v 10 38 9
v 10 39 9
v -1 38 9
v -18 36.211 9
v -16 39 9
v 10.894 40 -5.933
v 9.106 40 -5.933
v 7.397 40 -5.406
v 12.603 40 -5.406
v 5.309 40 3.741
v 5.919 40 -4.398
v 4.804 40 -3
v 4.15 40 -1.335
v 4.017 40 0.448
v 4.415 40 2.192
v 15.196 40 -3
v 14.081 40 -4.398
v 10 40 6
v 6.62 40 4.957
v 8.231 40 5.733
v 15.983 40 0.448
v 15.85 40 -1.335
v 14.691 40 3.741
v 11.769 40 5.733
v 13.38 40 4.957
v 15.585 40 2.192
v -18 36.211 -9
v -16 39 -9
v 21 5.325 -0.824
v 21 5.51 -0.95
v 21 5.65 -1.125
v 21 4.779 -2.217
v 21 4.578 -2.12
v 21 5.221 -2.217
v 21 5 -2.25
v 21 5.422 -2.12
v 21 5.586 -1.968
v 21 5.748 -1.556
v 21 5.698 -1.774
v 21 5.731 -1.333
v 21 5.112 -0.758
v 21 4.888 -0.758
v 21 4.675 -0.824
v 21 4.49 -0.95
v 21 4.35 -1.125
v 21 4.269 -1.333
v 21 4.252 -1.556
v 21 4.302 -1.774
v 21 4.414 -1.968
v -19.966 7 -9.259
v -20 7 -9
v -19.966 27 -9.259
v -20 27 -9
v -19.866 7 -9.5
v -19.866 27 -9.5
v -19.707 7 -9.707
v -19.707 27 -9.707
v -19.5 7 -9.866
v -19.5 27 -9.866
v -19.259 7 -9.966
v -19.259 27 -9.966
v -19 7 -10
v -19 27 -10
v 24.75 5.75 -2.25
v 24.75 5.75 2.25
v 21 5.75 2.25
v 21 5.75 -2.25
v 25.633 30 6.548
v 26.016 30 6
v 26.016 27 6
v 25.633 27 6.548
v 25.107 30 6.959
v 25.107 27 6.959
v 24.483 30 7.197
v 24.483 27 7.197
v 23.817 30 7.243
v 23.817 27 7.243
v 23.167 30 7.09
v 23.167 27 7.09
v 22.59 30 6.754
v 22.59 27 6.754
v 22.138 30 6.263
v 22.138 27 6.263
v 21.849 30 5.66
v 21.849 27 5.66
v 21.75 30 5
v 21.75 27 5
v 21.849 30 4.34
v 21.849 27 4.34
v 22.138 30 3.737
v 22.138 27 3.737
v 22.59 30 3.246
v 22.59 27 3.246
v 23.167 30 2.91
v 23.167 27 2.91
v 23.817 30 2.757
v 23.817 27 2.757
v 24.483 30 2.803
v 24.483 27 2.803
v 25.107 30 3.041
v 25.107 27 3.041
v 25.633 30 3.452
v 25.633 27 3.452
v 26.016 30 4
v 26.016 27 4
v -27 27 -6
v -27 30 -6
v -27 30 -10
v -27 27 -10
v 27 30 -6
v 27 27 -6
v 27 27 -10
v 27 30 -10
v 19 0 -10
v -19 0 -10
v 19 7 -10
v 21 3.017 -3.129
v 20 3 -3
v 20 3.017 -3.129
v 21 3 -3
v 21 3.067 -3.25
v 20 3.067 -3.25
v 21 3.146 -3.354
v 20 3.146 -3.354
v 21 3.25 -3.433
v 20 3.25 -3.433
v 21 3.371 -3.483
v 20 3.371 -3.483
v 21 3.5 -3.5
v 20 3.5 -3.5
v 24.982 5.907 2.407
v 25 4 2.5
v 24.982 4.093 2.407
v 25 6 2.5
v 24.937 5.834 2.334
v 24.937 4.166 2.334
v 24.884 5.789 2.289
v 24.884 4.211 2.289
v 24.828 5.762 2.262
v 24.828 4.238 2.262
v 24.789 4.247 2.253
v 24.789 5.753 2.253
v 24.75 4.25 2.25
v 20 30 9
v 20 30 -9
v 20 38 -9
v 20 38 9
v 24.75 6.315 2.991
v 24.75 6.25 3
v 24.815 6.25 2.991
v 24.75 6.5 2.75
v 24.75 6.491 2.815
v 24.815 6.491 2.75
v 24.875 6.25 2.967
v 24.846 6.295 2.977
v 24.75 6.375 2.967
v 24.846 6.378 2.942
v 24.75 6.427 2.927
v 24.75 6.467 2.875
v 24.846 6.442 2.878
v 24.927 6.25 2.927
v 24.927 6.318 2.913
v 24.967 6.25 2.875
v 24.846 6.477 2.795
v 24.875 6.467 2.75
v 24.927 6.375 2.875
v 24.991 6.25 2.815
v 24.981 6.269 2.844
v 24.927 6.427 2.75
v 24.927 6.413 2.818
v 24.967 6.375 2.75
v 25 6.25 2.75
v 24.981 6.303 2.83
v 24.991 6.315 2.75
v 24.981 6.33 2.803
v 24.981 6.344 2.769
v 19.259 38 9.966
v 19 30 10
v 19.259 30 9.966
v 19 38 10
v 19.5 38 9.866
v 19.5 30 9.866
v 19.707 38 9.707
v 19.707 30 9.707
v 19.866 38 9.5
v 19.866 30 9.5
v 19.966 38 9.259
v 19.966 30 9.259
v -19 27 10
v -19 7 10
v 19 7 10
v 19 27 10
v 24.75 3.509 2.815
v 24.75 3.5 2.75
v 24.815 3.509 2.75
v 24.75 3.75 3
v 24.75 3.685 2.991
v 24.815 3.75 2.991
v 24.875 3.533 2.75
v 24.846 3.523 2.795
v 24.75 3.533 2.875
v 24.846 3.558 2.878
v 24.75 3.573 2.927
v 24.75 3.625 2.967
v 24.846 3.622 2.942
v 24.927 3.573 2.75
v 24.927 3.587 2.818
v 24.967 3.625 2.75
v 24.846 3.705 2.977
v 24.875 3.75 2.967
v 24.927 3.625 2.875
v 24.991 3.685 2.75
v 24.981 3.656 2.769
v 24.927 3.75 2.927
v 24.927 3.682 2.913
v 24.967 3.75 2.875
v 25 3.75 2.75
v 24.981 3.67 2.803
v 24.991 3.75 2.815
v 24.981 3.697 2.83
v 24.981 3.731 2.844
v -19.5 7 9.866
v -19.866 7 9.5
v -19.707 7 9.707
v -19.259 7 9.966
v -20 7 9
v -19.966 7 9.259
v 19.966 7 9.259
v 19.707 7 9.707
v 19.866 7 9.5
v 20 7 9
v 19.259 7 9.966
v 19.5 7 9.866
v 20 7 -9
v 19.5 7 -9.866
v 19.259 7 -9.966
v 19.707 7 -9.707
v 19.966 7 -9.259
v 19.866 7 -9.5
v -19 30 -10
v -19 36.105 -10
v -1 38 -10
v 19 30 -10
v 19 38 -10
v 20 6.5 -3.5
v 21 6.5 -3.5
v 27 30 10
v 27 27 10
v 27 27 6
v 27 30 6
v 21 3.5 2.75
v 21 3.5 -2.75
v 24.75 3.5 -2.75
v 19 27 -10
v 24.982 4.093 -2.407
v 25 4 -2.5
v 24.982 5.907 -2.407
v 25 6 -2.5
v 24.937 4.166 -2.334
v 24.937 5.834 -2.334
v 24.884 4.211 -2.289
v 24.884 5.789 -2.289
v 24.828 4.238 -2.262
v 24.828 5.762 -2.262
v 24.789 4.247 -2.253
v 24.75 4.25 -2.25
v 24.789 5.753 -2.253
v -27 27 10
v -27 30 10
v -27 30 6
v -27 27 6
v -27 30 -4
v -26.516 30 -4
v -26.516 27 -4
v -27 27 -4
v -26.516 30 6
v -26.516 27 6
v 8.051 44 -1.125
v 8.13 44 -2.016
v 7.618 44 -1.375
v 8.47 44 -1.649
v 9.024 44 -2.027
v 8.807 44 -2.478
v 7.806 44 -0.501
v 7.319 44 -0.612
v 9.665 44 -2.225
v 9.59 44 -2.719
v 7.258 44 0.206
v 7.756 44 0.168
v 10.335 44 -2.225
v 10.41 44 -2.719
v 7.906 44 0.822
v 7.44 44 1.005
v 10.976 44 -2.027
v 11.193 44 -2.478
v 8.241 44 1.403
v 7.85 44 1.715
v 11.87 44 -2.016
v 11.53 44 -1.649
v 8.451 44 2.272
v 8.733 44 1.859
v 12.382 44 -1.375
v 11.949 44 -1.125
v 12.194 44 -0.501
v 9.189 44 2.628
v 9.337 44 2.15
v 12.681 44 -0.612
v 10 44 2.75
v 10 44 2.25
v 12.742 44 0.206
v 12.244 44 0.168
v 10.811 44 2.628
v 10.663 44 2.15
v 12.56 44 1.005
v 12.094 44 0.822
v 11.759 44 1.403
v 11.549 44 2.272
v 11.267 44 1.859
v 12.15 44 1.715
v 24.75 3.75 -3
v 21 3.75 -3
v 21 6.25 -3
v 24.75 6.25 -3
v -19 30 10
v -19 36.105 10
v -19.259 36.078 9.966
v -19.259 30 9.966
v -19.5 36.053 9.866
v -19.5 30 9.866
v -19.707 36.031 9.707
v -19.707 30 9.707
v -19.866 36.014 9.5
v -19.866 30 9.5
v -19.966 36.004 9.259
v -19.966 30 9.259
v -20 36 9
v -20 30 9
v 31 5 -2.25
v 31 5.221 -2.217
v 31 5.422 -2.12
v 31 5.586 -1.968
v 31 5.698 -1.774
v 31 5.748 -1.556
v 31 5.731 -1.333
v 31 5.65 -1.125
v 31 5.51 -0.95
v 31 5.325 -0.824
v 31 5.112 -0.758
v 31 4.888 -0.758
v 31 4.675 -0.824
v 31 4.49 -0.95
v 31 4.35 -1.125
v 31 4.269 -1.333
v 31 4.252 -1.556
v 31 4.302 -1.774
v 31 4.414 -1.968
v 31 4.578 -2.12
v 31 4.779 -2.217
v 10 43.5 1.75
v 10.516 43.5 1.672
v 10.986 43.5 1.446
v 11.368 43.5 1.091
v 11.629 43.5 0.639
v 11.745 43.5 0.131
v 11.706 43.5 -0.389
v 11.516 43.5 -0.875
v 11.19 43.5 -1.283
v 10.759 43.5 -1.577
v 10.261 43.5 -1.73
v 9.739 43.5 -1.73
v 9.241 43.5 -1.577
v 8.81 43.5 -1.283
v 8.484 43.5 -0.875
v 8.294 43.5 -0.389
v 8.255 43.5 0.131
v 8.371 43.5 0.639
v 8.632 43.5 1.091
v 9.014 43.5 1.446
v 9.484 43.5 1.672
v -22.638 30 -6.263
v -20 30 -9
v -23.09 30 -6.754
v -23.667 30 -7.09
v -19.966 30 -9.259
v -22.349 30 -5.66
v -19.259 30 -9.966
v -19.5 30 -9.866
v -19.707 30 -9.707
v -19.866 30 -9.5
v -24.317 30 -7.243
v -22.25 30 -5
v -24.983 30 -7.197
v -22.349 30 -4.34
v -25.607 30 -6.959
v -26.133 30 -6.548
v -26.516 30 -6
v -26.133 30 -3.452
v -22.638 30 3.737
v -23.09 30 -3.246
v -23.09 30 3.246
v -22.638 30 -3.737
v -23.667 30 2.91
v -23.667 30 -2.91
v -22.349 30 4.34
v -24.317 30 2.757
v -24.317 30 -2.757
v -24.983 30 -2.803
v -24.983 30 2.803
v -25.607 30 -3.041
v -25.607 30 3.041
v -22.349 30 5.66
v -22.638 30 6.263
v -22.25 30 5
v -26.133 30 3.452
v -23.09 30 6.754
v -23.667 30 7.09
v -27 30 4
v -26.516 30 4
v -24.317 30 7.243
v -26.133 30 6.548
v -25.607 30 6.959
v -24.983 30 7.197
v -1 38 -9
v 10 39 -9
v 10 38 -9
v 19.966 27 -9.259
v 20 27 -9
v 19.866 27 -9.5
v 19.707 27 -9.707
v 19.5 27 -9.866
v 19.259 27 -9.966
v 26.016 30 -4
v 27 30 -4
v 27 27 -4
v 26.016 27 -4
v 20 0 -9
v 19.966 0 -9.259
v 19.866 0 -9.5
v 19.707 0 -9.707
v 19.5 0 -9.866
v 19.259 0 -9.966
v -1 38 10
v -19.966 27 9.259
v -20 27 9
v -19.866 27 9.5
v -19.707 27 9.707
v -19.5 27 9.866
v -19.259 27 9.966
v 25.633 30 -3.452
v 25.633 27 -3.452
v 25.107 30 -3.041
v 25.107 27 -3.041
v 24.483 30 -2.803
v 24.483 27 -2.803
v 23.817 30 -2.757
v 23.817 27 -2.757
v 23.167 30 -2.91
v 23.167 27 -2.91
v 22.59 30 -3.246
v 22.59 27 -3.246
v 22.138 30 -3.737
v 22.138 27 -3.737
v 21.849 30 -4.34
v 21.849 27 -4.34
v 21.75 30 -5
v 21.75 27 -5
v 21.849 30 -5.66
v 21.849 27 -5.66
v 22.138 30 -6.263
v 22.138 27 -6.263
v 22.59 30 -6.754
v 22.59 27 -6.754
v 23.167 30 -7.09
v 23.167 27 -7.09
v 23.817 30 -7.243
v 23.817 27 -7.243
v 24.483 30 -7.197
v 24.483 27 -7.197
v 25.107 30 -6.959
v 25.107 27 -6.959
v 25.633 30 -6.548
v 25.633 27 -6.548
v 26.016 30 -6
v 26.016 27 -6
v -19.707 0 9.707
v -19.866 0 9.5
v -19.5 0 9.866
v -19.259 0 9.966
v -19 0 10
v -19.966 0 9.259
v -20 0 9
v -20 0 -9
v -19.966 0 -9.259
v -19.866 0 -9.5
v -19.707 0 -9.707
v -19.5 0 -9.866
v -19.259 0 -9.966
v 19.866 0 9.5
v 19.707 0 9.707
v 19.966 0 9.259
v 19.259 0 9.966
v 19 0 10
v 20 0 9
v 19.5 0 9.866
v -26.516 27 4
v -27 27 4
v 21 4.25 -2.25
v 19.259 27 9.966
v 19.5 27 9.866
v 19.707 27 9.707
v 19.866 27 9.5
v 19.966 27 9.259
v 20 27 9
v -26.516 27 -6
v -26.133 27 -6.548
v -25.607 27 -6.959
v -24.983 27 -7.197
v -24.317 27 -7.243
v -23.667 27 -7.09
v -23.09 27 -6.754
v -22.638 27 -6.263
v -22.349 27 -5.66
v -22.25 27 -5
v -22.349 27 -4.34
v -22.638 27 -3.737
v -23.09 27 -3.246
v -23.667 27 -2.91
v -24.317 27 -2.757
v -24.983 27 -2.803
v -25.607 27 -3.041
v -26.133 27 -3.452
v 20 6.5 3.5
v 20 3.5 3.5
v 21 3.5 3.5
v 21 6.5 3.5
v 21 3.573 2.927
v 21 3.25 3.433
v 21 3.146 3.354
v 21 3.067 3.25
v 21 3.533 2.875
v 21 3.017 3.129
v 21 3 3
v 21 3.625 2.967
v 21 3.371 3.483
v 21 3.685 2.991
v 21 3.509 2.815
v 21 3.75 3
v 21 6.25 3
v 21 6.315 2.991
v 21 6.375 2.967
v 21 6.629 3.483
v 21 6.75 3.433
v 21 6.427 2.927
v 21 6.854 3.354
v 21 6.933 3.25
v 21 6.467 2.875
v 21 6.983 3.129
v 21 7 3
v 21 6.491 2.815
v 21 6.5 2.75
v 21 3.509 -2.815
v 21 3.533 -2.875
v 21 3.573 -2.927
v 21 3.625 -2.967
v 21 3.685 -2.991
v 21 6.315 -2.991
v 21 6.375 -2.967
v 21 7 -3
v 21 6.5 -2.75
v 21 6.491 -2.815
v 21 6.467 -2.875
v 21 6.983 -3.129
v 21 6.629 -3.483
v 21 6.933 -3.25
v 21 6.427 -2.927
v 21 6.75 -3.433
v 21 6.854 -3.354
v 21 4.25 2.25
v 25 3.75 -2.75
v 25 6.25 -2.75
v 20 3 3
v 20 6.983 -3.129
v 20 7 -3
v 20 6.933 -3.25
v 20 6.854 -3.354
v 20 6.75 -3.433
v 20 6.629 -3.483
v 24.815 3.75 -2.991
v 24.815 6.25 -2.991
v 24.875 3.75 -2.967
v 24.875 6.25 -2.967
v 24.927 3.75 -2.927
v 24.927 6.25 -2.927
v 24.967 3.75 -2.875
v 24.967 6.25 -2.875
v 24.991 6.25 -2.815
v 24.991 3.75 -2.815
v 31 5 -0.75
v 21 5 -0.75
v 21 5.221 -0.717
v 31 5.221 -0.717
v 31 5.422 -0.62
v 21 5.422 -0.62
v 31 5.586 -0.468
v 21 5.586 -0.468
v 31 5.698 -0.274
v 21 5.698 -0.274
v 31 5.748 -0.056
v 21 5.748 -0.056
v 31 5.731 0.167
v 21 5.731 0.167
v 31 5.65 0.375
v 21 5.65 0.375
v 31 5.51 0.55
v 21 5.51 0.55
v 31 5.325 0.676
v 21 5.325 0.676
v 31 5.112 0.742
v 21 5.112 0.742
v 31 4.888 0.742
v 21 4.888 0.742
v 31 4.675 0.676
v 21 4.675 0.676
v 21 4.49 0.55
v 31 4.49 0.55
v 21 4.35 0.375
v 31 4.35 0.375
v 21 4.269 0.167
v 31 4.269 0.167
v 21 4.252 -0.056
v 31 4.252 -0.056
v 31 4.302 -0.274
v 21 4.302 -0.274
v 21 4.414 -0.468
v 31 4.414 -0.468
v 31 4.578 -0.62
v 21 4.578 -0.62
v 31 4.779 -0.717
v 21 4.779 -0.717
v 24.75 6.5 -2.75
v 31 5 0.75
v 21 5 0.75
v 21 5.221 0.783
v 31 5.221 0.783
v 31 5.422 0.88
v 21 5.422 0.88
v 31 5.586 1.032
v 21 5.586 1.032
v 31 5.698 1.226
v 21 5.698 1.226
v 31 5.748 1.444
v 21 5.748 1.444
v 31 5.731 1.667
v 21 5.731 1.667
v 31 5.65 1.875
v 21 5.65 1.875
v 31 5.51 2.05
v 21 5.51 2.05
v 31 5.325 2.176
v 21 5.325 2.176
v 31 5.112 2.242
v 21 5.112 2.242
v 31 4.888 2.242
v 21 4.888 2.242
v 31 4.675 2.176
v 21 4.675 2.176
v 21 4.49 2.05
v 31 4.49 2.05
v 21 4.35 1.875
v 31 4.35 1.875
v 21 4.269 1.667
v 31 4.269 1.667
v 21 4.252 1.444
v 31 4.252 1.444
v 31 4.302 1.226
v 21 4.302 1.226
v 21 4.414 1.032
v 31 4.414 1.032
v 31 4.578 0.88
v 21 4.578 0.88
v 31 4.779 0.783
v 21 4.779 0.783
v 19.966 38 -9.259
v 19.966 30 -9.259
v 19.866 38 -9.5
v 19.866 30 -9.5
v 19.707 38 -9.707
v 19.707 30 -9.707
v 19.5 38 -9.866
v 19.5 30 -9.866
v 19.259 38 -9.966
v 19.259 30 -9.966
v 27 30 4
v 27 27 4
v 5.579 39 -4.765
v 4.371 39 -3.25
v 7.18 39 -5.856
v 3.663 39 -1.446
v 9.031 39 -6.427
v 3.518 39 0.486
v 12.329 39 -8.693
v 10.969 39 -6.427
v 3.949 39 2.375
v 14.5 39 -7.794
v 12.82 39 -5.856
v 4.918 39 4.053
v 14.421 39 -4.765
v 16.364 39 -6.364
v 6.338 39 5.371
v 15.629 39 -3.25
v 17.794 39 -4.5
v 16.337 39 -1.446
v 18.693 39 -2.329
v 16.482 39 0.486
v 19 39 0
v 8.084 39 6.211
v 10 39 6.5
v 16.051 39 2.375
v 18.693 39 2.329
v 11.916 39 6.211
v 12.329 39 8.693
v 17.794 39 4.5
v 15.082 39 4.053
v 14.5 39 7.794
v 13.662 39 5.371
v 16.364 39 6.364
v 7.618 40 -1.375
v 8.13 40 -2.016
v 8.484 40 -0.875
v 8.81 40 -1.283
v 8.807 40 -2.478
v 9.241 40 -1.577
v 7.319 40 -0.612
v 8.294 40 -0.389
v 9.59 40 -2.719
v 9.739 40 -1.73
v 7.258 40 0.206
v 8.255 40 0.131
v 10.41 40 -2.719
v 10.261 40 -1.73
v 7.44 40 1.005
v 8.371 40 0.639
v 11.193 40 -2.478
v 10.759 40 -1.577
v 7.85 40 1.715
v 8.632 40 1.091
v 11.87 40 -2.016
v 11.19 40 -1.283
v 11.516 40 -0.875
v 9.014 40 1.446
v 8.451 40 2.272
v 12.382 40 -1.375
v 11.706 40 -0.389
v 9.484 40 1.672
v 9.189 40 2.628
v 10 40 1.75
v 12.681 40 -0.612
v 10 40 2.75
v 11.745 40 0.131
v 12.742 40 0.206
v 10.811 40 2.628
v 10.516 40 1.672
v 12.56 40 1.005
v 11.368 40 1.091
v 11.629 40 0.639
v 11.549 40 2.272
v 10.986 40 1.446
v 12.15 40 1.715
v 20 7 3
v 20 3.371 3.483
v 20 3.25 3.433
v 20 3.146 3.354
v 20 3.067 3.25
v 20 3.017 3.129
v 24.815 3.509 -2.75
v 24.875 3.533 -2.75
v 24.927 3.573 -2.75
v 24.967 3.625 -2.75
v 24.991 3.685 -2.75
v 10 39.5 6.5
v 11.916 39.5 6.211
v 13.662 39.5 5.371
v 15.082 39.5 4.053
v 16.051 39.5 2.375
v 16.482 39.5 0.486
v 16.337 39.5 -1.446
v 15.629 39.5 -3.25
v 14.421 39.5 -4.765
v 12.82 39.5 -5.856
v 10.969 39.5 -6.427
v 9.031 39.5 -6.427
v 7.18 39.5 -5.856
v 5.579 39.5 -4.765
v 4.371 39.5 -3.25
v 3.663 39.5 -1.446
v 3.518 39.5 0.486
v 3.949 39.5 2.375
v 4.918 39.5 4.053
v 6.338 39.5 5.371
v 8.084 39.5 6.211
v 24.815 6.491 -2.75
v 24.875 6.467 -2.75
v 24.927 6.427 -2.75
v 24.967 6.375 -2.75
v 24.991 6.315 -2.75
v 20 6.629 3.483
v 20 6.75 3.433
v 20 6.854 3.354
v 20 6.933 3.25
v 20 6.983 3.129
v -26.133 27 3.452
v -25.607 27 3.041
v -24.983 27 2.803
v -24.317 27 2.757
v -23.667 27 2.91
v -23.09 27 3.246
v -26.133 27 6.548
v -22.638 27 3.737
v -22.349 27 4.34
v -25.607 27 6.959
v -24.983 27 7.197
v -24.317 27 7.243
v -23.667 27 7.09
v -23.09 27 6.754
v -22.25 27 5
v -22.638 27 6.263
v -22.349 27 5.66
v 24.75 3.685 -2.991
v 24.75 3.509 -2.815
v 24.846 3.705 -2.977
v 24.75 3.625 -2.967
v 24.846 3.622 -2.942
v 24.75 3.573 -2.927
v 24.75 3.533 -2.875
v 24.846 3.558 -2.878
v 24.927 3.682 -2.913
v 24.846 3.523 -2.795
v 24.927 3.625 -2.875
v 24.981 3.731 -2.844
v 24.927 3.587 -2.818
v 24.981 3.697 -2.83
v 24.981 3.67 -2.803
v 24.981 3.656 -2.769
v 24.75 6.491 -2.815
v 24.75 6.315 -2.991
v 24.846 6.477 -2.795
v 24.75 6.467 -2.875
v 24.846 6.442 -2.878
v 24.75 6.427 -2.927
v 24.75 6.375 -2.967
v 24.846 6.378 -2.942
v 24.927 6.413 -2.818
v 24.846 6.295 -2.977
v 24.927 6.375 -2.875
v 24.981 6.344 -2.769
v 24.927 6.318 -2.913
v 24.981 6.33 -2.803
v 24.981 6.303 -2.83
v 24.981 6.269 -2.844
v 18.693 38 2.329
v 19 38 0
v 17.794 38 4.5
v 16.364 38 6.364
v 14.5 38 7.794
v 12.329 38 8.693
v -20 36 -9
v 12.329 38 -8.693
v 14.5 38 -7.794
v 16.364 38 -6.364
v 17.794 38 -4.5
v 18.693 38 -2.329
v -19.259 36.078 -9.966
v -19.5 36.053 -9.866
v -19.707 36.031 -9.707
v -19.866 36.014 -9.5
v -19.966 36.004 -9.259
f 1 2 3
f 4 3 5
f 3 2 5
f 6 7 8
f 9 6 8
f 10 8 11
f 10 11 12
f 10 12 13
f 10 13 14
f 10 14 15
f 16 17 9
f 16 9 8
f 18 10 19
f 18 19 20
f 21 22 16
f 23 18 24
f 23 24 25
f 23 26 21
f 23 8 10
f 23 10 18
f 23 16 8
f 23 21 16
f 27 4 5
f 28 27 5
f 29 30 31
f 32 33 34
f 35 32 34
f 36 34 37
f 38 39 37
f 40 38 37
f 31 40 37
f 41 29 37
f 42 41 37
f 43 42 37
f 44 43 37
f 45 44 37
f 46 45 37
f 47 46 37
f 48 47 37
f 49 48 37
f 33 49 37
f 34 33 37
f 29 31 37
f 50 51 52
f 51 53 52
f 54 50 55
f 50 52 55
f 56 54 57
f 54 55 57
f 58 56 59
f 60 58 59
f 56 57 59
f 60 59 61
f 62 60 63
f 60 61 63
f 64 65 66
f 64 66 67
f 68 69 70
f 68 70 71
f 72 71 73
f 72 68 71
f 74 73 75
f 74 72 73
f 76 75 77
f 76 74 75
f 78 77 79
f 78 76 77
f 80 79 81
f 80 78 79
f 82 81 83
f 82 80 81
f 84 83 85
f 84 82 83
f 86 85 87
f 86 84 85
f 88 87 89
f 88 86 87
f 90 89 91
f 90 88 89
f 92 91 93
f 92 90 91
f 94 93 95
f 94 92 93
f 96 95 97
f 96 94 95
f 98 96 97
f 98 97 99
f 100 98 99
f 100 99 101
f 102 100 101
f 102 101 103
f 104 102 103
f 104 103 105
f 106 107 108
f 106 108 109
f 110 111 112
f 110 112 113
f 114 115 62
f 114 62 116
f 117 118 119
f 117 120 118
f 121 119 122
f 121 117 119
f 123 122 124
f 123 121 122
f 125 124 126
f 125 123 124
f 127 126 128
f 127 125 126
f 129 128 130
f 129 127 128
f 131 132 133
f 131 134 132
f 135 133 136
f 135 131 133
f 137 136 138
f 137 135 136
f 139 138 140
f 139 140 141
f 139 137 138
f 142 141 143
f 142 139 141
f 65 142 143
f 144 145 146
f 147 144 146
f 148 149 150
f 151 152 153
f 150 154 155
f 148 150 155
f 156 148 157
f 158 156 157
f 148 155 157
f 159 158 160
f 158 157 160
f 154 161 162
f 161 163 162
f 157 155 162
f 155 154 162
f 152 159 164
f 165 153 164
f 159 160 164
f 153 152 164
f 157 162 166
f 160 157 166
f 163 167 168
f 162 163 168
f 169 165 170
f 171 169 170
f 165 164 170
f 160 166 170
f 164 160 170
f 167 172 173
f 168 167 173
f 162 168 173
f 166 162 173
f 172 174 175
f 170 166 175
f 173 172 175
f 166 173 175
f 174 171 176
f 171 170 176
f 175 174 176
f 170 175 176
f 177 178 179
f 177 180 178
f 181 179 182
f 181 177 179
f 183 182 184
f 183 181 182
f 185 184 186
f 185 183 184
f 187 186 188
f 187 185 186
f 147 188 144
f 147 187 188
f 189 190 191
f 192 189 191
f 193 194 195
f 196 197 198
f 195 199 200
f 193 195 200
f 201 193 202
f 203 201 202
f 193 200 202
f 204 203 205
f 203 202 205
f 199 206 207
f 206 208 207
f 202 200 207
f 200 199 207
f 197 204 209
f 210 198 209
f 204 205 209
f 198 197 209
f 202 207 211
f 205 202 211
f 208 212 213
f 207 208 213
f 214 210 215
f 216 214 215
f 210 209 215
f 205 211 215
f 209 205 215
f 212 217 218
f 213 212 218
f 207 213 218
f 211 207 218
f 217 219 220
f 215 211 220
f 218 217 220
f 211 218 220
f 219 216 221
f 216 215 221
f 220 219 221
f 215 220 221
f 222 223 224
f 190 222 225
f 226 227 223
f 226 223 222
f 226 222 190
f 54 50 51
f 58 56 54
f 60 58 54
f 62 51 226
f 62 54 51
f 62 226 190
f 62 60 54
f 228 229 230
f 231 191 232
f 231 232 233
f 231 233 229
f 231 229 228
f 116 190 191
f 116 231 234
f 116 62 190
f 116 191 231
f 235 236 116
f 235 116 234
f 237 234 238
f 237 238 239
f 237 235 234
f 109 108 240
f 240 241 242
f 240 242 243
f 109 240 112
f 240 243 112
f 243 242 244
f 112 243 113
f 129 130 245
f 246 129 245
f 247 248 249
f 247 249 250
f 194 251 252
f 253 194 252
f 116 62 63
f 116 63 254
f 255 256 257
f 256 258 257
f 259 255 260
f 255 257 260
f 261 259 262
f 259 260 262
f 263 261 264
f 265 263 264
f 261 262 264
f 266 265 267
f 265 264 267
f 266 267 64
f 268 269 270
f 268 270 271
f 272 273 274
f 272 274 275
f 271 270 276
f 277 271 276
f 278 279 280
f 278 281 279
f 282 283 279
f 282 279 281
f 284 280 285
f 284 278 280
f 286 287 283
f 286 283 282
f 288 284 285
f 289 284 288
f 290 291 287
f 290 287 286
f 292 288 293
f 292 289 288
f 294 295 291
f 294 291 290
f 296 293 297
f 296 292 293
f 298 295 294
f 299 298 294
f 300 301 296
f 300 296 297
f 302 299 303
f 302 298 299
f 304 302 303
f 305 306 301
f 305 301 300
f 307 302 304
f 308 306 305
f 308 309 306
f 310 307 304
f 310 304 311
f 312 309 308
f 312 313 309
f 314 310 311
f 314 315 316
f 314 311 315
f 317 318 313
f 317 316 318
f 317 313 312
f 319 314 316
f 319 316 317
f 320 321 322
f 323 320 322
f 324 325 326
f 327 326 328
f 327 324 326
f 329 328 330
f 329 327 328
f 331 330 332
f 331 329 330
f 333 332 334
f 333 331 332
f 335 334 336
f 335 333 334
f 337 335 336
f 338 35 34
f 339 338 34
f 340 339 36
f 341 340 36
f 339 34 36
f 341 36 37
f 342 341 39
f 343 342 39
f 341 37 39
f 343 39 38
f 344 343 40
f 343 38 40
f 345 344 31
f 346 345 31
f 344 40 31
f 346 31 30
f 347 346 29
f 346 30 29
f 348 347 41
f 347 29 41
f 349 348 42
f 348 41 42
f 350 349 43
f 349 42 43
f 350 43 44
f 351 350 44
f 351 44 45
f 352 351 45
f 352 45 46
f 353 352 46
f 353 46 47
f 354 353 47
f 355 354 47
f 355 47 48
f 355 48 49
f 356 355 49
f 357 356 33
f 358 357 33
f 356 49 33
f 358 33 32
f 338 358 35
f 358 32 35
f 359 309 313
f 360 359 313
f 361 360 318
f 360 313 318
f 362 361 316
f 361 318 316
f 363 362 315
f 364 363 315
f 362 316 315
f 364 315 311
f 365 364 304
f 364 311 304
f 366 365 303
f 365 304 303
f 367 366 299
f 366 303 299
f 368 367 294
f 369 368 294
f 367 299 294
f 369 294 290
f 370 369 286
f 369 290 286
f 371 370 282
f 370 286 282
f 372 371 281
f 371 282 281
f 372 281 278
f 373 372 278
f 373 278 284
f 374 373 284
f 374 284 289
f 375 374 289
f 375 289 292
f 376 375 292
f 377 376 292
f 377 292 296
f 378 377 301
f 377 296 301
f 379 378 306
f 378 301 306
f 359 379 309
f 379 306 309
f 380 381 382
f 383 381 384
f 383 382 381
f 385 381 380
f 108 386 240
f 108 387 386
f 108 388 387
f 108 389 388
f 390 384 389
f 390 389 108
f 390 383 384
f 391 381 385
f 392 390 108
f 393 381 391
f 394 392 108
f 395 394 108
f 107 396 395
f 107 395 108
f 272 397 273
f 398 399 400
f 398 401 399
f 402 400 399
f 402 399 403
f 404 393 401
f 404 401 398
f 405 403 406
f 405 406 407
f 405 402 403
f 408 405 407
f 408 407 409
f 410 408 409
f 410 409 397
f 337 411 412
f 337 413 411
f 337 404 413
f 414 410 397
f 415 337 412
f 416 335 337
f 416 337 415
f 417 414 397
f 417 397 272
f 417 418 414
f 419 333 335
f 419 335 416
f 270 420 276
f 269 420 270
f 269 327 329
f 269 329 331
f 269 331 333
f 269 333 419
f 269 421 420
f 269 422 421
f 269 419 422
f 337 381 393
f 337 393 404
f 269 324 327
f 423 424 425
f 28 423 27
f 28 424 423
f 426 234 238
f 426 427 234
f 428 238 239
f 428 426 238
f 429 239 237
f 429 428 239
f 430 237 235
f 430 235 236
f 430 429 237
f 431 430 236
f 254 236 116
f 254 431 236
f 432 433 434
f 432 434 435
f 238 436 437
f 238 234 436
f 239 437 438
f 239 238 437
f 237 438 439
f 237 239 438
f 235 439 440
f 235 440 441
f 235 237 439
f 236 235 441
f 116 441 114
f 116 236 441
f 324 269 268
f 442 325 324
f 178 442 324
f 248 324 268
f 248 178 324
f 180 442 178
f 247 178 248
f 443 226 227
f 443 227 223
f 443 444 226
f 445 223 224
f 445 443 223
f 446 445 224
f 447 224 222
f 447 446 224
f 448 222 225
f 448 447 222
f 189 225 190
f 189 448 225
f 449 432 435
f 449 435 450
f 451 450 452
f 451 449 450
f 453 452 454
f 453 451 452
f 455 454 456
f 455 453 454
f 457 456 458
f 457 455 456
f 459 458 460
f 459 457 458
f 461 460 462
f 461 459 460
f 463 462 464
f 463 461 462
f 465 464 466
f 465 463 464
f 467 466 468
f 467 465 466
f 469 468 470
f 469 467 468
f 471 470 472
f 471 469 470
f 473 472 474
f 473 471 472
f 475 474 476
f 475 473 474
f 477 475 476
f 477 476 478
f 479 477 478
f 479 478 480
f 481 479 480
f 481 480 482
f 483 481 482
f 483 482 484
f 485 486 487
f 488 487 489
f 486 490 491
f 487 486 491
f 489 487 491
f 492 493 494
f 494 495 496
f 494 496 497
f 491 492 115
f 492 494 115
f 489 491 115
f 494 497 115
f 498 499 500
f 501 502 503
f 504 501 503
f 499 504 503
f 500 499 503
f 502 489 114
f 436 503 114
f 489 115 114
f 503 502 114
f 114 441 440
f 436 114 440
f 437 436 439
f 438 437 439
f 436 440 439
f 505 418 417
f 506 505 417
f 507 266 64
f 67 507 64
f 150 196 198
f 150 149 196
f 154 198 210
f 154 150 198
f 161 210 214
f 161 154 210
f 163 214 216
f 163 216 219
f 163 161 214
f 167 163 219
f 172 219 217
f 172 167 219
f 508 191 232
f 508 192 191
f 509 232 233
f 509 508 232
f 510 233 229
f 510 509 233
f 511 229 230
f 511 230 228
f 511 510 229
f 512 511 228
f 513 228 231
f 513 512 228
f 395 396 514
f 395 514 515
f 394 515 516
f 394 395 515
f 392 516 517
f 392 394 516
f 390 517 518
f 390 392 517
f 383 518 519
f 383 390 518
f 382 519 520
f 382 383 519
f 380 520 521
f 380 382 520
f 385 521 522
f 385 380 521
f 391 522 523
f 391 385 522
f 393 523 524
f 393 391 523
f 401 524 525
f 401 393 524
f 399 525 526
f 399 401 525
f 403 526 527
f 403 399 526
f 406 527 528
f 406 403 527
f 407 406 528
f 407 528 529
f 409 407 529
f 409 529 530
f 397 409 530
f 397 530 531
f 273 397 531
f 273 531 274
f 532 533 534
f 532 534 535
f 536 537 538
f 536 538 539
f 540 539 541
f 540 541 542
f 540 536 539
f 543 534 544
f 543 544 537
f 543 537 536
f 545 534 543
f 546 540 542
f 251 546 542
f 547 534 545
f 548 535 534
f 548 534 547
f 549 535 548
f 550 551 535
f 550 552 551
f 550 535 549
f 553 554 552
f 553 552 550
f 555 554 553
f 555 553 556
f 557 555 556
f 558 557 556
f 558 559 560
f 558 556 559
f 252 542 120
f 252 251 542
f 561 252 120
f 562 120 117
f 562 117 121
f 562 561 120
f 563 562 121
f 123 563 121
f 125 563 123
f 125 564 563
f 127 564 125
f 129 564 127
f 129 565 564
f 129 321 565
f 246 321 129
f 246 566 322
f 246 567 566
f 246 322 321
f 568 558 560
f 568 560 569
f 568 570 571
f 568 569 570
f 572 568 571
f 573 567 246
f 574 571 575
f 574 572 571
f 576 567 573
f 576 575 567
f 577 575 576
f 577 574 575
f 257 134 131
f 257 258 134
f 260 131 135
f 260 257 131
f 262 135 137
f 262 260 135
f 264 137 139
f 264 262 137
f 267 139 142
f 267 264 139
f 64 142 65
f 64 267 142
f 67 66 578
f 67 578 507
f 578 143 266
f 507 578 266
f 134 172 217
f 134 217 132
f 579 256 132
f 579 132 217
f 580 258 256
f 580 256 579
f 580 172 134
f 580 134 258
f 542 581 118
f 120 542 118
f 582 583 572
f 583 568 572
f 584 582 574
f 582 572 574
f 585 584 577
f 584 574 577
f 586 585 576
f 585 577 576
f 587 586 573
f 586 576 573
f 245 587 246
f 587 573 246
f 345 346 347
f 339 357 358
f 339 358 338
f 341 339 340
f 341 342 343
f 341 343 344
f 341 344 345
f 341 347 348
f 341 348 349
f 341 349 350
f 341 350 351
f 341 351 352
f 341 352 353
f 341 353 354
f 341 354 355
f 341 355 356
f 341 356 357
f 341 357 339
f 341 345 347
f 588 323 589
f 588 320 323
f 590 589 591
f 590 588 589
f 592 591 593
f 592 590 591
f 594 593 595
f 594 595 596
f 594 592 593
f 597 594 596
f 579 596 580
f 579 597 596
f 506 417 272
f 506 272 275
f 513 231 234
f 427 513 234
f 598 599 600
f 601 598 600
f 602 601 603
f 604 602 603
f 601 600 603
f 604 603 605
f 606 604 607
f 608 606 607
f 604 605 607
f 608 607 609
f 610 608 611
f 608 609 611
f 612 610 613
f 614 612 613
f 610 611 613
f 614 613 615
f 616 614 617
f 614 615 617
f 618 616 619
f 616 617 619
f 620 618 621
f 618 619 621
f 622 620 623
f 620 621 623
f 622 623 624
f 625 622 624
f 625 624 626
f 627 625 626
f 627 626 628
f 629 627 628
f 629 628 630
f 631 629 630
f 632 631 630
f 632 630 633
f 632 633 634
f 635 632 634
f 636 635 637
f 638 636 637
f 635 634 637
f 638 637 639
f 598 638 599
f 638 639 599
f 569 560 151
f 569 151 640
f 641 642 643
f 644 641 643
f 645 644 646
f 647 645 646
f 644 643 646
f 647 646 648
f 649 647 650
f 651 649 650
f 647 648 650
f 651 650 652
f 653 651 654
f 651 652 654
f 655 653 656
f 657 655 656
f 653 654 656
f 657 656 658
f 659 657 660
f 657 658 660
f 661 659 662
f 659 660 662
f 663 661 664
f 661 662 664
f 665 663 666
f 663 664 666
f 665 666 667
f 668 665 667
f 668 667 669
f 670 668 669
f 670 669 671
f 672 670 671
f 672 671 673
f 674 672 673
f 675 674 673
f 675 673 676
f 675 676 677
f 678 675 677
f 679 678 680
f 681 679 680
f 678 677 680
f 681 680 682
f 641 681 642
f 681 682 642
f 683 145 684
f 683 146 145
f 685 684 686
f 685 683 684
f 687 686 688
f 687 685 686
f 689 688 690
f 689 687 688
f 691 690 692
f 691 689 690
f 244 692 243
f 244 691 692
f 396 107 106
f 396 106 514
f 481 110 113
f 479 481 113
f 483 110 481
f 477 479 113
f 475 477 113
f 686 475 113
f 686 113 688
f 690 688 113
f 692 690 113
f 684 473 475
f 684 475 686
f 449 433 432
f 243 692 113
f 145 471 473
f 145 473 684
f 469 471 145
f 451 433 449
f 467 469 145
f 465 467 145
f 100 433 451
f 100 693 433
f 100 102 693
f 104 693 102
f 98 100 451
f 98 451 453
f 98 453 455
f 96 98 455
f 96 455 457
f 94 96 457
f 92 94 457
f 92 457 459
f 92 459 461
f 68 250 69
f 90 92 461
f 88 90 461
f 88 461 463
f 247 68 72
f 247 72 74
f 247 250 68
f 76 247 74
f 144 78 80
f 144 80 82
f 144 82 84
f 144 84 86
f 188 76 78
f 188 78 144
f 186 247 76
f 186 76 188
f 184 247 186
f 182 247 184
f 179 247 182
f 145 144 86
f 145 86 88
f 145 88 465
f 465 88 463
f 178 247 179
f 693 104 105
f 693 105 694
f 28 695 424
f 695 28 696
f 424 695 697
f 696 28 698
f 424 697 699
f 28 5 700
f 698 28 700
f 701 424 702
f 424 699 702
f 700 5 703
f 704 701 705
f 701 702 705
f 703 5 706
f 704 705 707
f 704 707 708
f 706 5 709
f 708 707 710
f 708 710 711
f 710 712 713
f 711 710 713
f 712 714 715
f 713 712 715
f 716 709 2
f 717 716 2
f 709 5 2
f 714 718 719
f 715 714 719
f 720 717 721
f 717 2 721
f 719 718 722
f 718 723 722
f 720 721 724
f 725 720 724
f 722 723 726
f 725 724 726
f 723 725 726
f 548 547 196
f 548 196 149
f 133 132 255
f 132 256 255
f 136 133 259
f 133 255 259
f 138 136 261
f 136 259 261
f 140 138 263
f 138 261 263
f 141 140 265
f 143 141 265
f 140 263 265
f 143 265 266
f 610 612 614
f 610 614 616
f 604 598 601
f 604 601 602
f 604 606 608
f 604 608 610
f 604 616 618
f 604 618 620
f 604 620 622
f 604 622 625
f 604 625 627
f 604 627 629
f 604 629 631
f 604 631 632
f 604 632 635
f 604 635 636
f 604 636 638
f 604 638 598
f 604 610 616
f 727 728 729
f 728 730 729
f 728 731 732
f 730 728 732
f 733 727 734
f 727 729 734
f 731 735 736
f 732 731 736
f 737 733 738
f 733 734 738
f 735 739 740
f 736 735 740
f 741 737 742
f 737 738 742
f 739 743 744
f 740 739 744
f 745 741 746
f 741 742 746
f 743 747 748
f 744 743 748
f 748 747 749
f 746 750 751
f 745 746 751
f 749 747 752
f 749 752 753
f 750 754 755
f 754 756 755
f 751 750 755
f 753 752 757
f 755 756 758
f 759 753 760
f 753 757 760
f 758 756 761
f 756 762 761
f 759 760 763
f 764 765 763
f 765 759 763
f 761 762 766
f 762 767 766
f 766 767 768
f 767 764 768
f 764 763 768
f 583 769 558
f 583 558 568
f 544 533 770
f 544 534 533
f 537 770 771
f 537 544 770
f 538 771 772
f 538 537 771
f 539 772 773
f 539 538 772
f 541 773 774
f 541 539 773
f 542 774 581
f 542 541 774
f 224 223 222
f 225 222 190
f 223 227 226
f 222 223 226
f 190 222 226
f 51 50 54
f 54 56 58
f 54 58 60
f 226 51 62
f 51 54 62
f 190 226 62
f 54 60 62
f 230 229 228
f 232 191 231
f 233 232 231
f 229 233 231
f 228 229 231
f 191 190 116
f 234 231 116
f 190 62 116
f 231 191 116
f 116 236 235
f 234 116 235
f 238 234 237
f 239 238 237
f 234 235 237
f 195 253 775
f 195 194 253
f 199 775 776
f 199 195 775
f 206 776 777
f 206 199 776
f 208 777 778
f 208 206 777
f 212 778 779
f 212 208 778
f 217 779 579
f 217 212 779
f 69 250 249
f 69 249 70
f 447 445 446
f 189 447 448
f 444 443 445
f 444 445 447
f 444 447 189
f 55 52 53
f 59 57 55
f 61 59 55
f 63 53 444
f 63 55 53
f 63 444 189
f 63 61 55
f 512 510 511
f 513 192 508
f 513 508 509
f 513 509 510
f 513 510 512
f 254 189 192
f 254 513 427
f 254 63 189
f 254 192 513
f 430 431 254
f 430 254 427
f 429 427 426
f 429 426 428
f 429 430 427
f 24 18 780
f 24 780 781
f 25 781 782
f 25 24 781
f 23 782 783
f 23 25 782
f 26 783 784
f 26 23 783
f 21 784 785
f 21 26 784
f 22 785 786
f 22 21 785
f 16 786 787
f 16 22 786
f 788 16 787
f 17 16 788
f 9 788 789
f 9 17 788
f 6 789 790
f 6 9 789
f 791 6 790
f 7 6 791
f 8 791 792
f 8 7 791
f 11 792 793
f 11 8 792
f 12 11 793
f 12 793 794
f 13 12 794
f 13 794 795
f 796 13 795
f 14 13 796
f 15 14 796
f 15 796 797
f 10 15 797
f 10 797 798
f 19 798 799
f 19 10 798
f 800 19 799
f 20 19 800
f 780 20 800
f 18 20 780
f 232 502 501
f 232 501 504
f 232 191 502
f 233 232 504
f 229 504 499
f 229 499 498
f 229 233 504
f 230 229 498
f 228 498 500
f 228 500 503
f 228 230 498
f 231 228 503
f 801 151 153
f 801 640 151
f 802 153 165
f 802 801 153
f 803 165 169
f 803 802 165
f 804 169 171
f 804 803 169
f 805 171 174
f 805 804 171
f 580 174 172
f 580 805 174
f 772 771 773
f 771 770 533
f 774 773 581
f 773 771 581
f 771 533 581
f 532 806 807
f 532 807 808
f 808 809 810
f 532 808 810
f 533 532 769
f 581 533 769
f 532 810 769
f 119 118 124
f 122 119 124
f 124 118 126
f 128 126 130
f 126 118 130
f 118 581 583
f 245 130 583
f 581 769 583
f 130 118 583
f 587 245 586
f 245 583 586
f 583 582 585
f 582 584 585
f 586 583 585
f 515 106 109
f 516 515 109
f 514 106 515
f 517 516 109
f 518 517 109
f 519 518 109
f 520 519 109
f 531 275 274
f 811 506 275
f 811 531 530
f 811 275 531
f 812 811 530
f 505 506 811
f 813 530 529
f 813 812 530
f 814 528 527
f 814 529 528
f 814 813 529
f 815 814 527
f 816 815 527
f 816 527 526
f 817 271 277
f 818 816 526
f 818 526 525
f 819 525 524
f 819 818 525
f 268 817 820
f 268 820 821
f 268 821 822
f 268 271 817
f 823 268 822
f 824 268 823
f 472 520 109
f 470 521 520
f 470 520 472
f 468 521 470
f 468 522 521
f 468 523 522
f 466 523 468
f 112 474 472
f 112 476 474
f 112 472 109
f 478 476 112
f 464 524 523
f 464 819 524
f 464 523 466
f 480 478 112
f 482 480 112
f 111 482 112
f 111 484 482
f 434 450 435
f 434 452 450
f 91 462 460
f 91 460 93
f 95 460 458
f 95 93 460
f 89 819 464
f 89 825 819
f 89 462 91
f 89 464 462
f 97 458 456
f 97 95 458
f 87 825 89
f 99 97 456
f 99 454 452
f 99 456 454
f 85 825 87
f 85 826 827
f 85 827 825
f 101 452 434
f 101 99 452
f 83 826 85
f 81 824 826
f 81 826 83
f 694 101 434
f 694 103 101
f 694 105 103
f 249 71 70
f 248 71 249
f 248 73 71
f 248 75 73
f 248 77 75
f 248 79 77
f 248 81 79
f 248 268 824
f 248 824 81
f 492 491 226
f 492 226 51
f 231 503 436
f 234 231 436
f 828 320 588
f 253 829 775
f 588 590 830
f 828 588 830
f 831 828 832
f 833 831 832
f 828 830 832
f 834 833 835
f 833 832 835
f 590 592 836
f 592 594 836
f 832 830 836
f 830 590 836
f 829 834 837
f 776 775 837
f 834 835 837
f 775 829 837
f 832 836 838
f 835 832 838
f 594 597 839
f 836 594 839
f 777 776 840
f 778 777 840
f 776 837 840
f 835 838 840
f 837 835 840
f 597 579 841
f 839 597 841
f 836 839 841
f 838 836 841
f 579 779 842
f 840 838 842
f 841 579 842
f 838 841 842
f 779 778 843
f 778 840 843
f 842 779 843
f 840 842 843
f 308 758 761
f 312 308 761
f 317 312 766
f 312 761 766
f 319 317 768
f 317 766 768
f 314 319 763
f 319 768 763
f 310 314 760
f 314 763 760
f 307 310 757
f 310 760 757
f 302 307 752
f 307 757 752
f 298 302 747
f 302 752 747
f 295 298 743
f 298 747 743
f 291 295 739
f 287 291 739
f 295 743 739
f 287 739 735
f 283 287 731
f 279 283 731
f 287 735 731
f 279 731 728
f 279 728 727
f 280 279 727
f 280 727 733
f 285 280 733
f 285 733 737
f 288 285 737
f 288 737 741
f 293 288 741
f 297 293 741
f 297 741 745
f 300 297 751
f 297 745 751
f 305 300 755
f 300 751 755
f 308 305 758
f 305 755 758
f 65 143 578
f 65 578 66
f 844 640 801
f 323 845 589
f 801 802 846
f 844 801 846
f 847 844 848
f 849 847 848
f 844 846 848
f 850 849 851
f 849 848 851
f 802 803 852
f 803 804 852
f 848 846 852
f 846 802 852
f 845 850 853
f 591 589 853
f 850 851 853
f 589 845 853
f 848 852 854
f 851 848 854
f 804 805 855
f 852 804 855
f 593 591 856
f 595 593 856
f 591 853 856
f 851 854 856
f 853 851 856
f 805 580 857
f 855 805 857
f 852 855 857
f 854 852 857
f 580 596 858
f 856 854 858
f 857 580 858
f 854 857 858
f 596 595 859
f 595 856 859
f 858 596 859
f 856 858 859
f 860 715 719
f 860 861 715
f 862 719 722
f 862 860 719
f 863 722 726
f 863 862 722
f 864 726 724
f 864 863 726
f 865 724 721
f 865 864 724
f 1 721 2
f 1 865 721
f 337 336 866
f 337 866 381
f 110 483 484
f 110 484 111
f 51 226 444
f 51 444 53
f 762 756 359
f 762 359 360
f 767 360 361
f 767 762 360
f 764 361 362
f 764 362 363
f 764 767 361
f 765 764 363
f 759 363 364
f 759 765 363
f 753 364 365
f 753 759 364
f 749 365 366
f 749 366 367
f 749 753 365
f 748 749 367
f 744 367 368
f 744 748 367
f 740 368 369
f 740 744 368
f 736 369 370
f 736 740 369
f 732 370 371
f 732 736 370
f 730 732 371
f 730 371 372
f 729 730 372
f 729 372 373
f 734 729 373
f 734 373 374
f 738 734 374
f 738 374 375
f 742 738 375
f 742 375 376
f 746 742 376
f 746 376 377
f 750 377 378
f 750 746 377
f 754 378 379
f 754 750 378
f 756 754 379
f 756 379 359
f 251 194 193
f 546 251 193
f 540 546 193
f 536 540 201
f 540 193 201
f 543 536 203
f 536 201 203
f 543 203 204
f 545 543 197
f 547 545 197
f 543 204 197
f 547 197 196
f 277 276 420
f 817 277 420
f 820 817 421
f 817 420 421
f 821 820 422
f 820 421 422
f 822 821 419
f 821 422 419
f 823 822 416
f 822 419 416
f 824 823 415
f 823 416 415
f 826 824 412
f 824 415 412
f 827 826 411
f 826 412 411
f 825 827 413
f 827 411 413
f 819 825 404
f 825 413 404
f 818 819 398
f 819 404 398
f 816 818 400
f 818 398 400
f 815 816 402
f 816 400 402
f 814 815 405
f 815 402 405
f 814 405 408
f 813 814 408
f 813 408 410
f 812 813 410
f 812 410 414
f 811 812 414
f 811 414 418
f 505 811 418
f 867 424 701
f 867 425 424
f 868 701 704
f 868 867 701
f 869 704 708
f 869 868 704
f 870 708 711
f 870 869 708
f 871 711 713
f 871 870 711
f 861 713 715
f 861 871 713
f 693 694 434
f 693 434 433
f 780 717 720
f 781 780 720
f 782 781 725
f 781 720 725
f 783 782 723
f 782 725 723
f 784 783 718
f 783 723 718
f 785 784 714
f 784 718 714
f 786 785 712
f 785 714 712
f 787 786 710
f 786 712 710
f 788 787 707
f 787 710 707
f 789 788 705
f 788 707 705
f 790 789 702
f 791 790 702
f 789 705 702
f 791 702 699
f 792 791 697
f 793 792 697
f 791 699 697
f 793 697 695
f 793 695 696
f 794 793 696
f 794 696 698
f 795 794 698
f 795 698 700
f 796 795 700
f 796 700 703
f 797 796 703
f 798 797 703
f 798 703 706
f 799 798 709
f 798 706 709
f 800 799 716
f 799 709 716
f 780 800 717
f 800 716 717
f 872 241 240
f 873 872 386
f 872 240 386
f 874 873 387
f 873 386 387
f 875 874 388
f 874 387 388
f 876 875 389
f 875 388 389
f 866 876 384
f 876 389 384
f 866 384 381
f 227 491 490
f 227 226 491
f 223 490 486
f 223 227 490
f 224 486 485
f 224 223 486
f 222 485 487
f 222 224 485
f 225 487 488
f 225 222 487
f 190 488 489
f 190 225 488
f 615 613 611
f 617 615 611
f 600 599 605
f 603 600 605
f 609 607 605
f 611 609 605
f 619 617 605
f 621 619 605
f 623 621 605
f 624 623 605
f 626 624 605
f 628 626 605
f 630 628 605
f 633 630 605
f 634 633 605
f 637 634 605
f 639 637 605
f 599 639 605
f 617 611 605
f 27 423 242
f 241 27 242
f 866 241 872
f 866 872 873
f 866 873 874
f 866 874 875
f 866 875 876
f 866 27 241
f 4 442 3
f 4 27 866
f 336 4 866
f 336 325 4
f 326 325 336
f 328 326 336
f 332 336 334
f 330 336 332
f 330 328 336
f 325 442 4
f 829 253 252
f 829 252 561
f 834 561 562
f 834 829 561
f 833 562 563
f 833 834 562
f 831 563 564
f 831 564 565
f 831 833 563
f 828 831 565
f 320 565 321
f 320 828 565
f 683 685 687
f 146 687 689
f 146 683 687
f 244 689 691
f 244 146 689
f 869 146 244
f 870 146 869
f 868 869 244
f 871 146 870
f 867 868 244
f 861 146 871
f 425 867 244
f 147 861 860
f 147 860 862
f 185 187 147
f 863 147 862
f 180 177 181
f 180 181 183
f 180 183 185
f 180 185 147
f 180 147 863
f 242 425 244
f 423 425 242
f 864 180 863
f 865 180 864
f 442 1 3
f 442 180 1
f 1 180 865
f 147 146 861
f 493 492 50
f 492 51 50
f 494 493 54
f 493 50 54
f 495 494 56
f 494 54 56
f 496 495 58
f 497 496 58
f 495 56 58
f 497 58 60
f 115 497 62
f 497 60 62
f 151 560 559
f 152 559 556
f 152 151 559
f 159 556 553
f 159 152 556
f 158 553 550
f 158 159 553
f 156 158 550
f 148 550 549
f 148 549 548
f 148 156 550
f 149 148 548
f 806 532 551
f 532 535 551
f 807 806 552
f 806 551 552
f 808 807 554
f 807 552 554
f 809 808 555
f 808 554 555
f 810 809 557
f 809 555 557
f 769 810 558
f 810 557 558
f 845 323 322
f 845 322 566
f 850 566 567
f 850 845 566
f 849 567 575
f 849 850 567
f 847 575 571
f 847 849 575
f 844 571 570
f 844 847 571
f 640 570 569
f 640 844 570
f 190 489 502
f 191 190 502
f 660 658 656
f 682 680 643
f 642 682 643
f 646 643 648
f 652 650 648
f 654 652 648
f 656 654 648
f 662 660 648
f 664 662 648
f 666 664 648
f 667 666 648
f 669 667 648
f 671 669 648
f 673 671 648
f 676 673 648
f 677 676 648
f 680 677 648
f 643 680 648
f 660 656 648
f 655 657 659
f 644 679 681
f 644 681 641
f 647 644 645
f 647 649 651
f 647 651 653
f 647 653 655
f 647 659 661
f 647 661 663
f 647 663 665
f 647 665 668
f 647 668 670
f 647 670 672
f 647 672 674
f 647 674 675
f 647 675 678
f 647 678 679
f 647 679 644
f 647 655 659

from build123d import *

# Parameters (mm, degrees)
SKETCH1_W            = 40
SKETCH1_H            = 20
BOSS_EXTRUDE1_DEPTH  = 7
SKETCH2_W            = 40
SKETCH2_H            = 20
BOSS_EXTRUDE2_DEPTH  = 20
BOSS_EXTRUDE3_DEPTH  = 20
BOSS_EXTRUDE4_DEPTH  = 9
SKETCH5_R            = 6.5
BOSS_EXTRUDE5_DEPTH  = 1
CHAMFER1_SIZE        = 0.5
FILLET1_R            = 9
FILLET2_R            = 1
FILLET3_R            = 1
FILLET4_R            = 1
CUT_EXTRUDE1_DEPTH   = 3
SKETCH7_R            = 2.75
SKETCH7_R_2          = 1.75
BOSS_EXTRUDE6_DEPTH  = 4
CHAMFER2_SIZE        = 0.5
SKETCH8_W            = 7
SKETCH8_H            = 4
BOSS_EXTRUDE7_DEPTH  = 1
SKETCH9_W            = 6
SKETCH9_H            = 3
BOSS_EXTRUDE8_DEPTH  = 4
SKETCH10_W           = 4.5
SKETCH10_H           = 1.5
CUT_EXTRUDE2_DEPTH   = 4
SKETCH11_R           = 0.75
BOSS_EXTRUDE9_DEPTH  = 10
SKETCH12_R           = 0.75
BOSS_EXTRUDE10_DEPTH = 10
SKETCH13_R           = 0.75
BOSS_EXTRUDE11_DEPTH = 10
FILLET5_R            = 0.5
FILLET6_R            = 0.25
FILLET7_R            = 0.25


with BuildPart() as part:
    # Sketch1 → Boss-Extrude1 (new body)
    with BuildSketch(Plane(origin=(0, 0, 0), x_dir=(1, 0, 0), z_dir=(0, 1, 0))):
        Rectangle(SKETCH1_W, SKETCH1_H)
    extrude(amount=BOSS_EXTRUDE1_DEPTH)

    # Fillet2
    fillet2_edges = [part.edges().sort_by_distance(p)[0] for p in [
        (-20, 3.5, -10),
        (20, 3.5, -10),
        (20, 3.5, 10),
        (-20, 3.5, 10),
    ]]
    fillet(fillet2_edges, radius=FILLET2_R)


with BuildPart() as body_2:
    # Sketch2 → Boss-Extrude2 (new body)
    with BuildSketch(Plane(origin=(0, 7, 0), x_dir=(1, 0, 0), z_dir=(0, 1, 0))):
        Rectangle(SKETCH2_W, SKETCH2_H)
    extrude(amount=BOSS_EXTRUDE2_DEPTH)

    # Fillet3
    fillet3_edges = [body_2.edges().sort_by_distance(p)[0] for p in [
        (-20, 17, -10),
        (20, 17, -10),
        (20, 17, 10),
        (-20, 17, 10),
    ]]
    fillet(fillet3_edges, radius=FILLET3_R)


with BuildPart() as body_3:
    # Sketch3 → Boss-Extrude3 (new body)
    with BuildSketch(Plane.XY.offset(10)):
        Polygon((-27, 27), (27, 27), (27, 30), (20, 30), (20, 38), (-1, 38), (-20, 36), (-20, 30), (-27, 30), align=None)
    extrude(amount=-BOSS_EXTRUDE3_DEPTH)

    # Sketch4 → Boss-Extrude4 (add, symmetric)
    with BuildSketch(Plane.XY):
        Polygon((-18, 36.210526316), (-16, 39), (19, 39), (19, 38), (-1, 38), align=None)
    extrude(amount=BOSS_EXTRUDE4_DEPTH, both=True)

    # Sketch5 → Boss-Extrude5 (add)
    with BuildSketch(Plane(origin=(0, 39, 0), x_dir=(1, 0, 0), z_dir=(0, 1, 0))):
        with Locations(Location((10, 0, 0), (0, 0, 270))):
            Circle(SKETCH5_R)
    extrude(amount=BOSS_EXTRUDE5_DEPTH)

    # Chamfer1
    chamfer1_edges = [body_3.edges().sort_by_distance(p)[0] for p in [
        (10, 40, -6.5),
    ]]
    chamfer(chamfer1_edges, length=CHAMFER1_SIZE)

    # Fillet1
    fillet1_edges = [body_3.edges().sort_by_distance(p)[0] for p in [
        (19, 38.5, -9),
        (19, 38.5, 9),
    ]]
    fillet(fillet1_edges, radius=FILLET1_R - 0.0001)  # a hair under: the kernel refuses the full size

    # Fillet4
    fillet4_edges = [body_3.edges().sort_by_distance(p)[0] for p in [
        (20, 34, 10),
        (20, 34, -10),
        (-20, 33, -10),
        (-20, 33, 10),
    ]]
    fillet(fillet4_edges, radius=FILLET4_R)

    # Sketch6 → Cut-Extrude1 (cut)
    with BuildSketch(Plane(origin=(0, 30, 0), x_dir=(1, 0, 0), z_dir=(0, 1, 0))):
        with BuildLine():
            Line((-27, 6), (-26.515564437, 6))
            ThreePointArc((-26.515564437, 6), (-22.25, 5), (-26.515564437, 4))
            Line((-26.515564437, 4), (-27, 4))
            Line((-27, 4), (-27, 6))
        make_face()
        with BuildLine():
            Line((-26.515564437, -4), (-27, -4))
            Line((-27, -4), (-27, -6))
            Line((-27, -6), (-26.515564437, -6))
            ThreePointArc((-26.515564437, -6), (-22.25, -5), (-26.515564437, -4))
        make_face()
        with BuildLine():
            Line((26.015564437, 6), (27, 6))
            Line((27, 6), (27, 4))
            Line((27, 4), (26.015564437, 4))
            ThreePointArc((26.015564437, 4), (21.75, 5), (26.015564437, 6))
        make_face()
        with BuildLine():
            Line((26.015564437, -4), (27, -4))
            Line((27, -4), (27, -6))
            Line((27, -6), (26.015564437, -6))
            ThreePointArc((26.015564437, -6), (21.75, -5), (26.015564437, -4))
        make_face()
    extrude(amount=-CUT_EXTRUDE1_DEPTH, mode=Mode.SUBTRACT)


with BuildPart() as body_4:
    # Sketch7 → Boss-Extrude6 (new body)
    with BuildSketch(Plane(origin=(0, 40, 0), x_dir=(1, 0, 0), z_dir=(0, 1, 0))):
        with Locations(Location((10, 0, 0), (0, 0, 270))):
            Circle(SKETCH7_R)
        with Locations(Location((10, 0, 0), (0, 0, 270))):
            Circle(SKETCH7_R_2, mode=Mode.SUBTRACT)
    extrude(amount=BOSS_EXTRUDE6_DEPTH)

    # Chamfer2
    chamfer2_edges = [body_4.edges().sort_by_distance(p)[0] for p in [
        (10, 44, -1.75),
    ]]
    chamfer(chamfer2_edges, length=CHAMFER2_SIZE)


with BuildPart() as body_5:
    # Sketch8 → Boss-Extrude7 (new body)
    with BuildSketch(Plane(origin=(20, 0, 0), x_dir=(0, 0, -1), z_dir=(1, 0, 0))):
        with Locations((0, 5)):
            Rectangle(SKETCH8_W, SKETCH8_H)
    extrude(amount=BOSS_EXTRUDE7_DEPTH)

    # Sketch9 → Boss-Extrude8 (add)
    with BuildSketch(Plane(origin=(21, 0, 0), x_dir=(0, 0, -1), z_dir=(1, 0, 0))):
        with Locations((0, 5)):
            Rectangle(SKETCH9_W, SKETCH9_H)
    extrude(amount=BOSS_EXTRUDE8_DEPTH)

    # Sketch10 → Cut-Extrude2 (cut)
    with BuildSketch(Plane(origin=(25, 0, 0), x_dir=(0, 0, -1), z_dir=(1, 0, 0))):
        with Locations((0, 5)):
            Rectangle(SKETCH10_W, SKETCH10_H)
    extrude(amount=-CUT_EXTRUDE2_DEPTH, mode=Mode.SUBTRACT)

    # Fillet5
    fillet5_edges = [body_5.edges().sort_by_distance(p)[0] for p in [
        (20.5, 7, 3.5),
        (20.5, 7, -3.5),
        (20.5, 3, -3.5),
        (20.5, 3, 3.5),
    ]]
    fillet(fillet5_edges, radius=FILLET5_R)

    # Fillet6
    fillet6_edges = [body_5.edges().sort_by_distance(p)[0] for p in [
        (23, 6.5, 3),
        (23, 3.5, 3),
        (23, 3.5, -3),
        (23, 6.5, -3),
    ]]
    fillet(fillet6_edges, radius=FILLET6_R)

    # Fillet7
    fillet7_edges = [body_5.edges().sort_by_distance(p)[0] for p in [
        (25, 5, 2.25),
        (25, 4.25, 0),
        (25, 5, -2.25),
        (25, 5.75, 0),
        (25, 5, 3),
        (25, 6.5, 0),
        (25, 3.5, 0),
        (25, 5, -3),
        (25, 3.573223305, 2.926776695),
        (25, 3.573223305, -2.926776695),
        (25, 6.426776695, -2.926776695),
        (25, 6.426776695, 2.926776695),
    ]]
    fillet(fillet7_edges, radius=FILLET7_R)


with BuildPart() as body_6:
    # Sketch11 → Boss-Extrude9 (new body)
    with BuildSketch(Plane(origin=(21, 0, 0), x_dir=(0, 0, -1), z_dir=(1, 0, 0))):
        with Locations((0, 5)):
            Circle(SKETCH11_R)
    extrude(amount=BOSS_EXTRUDE9_DEPTH)


with BuildPart() as body_7:
    # Sketch12 → Boss-Extrude10 (new body)
    with BuildSketch(Plane(origin=(21, 0, 0), x_dir=(0, 0, -1), z_dir=(1, 0, 0))):
        with Locations((1.5, 5)):
            Circle(SKETCH12_R)
    extrude(amount=BOSS_EXTRUDE10_DEPTH)


with BuildPart() as body_8:
    # Sketch13 → Boss-Extrude11 (new body)
    with BuildSketch(Plane(origin=(21, 0, 0), x_dir=(0, 0, -1), z_dir=(1, 0, 0))):
        with Locations((-1.5, 5)):
            Circle(SKETCH13_R)
    extrude(amount=BOSS_EXTRUDE11_DEPTH)


solid = Compound([part.part, body_2.part, body_3.part, body_4.part, body_5.part, body_6.part, body_7.part, body_8.part])
